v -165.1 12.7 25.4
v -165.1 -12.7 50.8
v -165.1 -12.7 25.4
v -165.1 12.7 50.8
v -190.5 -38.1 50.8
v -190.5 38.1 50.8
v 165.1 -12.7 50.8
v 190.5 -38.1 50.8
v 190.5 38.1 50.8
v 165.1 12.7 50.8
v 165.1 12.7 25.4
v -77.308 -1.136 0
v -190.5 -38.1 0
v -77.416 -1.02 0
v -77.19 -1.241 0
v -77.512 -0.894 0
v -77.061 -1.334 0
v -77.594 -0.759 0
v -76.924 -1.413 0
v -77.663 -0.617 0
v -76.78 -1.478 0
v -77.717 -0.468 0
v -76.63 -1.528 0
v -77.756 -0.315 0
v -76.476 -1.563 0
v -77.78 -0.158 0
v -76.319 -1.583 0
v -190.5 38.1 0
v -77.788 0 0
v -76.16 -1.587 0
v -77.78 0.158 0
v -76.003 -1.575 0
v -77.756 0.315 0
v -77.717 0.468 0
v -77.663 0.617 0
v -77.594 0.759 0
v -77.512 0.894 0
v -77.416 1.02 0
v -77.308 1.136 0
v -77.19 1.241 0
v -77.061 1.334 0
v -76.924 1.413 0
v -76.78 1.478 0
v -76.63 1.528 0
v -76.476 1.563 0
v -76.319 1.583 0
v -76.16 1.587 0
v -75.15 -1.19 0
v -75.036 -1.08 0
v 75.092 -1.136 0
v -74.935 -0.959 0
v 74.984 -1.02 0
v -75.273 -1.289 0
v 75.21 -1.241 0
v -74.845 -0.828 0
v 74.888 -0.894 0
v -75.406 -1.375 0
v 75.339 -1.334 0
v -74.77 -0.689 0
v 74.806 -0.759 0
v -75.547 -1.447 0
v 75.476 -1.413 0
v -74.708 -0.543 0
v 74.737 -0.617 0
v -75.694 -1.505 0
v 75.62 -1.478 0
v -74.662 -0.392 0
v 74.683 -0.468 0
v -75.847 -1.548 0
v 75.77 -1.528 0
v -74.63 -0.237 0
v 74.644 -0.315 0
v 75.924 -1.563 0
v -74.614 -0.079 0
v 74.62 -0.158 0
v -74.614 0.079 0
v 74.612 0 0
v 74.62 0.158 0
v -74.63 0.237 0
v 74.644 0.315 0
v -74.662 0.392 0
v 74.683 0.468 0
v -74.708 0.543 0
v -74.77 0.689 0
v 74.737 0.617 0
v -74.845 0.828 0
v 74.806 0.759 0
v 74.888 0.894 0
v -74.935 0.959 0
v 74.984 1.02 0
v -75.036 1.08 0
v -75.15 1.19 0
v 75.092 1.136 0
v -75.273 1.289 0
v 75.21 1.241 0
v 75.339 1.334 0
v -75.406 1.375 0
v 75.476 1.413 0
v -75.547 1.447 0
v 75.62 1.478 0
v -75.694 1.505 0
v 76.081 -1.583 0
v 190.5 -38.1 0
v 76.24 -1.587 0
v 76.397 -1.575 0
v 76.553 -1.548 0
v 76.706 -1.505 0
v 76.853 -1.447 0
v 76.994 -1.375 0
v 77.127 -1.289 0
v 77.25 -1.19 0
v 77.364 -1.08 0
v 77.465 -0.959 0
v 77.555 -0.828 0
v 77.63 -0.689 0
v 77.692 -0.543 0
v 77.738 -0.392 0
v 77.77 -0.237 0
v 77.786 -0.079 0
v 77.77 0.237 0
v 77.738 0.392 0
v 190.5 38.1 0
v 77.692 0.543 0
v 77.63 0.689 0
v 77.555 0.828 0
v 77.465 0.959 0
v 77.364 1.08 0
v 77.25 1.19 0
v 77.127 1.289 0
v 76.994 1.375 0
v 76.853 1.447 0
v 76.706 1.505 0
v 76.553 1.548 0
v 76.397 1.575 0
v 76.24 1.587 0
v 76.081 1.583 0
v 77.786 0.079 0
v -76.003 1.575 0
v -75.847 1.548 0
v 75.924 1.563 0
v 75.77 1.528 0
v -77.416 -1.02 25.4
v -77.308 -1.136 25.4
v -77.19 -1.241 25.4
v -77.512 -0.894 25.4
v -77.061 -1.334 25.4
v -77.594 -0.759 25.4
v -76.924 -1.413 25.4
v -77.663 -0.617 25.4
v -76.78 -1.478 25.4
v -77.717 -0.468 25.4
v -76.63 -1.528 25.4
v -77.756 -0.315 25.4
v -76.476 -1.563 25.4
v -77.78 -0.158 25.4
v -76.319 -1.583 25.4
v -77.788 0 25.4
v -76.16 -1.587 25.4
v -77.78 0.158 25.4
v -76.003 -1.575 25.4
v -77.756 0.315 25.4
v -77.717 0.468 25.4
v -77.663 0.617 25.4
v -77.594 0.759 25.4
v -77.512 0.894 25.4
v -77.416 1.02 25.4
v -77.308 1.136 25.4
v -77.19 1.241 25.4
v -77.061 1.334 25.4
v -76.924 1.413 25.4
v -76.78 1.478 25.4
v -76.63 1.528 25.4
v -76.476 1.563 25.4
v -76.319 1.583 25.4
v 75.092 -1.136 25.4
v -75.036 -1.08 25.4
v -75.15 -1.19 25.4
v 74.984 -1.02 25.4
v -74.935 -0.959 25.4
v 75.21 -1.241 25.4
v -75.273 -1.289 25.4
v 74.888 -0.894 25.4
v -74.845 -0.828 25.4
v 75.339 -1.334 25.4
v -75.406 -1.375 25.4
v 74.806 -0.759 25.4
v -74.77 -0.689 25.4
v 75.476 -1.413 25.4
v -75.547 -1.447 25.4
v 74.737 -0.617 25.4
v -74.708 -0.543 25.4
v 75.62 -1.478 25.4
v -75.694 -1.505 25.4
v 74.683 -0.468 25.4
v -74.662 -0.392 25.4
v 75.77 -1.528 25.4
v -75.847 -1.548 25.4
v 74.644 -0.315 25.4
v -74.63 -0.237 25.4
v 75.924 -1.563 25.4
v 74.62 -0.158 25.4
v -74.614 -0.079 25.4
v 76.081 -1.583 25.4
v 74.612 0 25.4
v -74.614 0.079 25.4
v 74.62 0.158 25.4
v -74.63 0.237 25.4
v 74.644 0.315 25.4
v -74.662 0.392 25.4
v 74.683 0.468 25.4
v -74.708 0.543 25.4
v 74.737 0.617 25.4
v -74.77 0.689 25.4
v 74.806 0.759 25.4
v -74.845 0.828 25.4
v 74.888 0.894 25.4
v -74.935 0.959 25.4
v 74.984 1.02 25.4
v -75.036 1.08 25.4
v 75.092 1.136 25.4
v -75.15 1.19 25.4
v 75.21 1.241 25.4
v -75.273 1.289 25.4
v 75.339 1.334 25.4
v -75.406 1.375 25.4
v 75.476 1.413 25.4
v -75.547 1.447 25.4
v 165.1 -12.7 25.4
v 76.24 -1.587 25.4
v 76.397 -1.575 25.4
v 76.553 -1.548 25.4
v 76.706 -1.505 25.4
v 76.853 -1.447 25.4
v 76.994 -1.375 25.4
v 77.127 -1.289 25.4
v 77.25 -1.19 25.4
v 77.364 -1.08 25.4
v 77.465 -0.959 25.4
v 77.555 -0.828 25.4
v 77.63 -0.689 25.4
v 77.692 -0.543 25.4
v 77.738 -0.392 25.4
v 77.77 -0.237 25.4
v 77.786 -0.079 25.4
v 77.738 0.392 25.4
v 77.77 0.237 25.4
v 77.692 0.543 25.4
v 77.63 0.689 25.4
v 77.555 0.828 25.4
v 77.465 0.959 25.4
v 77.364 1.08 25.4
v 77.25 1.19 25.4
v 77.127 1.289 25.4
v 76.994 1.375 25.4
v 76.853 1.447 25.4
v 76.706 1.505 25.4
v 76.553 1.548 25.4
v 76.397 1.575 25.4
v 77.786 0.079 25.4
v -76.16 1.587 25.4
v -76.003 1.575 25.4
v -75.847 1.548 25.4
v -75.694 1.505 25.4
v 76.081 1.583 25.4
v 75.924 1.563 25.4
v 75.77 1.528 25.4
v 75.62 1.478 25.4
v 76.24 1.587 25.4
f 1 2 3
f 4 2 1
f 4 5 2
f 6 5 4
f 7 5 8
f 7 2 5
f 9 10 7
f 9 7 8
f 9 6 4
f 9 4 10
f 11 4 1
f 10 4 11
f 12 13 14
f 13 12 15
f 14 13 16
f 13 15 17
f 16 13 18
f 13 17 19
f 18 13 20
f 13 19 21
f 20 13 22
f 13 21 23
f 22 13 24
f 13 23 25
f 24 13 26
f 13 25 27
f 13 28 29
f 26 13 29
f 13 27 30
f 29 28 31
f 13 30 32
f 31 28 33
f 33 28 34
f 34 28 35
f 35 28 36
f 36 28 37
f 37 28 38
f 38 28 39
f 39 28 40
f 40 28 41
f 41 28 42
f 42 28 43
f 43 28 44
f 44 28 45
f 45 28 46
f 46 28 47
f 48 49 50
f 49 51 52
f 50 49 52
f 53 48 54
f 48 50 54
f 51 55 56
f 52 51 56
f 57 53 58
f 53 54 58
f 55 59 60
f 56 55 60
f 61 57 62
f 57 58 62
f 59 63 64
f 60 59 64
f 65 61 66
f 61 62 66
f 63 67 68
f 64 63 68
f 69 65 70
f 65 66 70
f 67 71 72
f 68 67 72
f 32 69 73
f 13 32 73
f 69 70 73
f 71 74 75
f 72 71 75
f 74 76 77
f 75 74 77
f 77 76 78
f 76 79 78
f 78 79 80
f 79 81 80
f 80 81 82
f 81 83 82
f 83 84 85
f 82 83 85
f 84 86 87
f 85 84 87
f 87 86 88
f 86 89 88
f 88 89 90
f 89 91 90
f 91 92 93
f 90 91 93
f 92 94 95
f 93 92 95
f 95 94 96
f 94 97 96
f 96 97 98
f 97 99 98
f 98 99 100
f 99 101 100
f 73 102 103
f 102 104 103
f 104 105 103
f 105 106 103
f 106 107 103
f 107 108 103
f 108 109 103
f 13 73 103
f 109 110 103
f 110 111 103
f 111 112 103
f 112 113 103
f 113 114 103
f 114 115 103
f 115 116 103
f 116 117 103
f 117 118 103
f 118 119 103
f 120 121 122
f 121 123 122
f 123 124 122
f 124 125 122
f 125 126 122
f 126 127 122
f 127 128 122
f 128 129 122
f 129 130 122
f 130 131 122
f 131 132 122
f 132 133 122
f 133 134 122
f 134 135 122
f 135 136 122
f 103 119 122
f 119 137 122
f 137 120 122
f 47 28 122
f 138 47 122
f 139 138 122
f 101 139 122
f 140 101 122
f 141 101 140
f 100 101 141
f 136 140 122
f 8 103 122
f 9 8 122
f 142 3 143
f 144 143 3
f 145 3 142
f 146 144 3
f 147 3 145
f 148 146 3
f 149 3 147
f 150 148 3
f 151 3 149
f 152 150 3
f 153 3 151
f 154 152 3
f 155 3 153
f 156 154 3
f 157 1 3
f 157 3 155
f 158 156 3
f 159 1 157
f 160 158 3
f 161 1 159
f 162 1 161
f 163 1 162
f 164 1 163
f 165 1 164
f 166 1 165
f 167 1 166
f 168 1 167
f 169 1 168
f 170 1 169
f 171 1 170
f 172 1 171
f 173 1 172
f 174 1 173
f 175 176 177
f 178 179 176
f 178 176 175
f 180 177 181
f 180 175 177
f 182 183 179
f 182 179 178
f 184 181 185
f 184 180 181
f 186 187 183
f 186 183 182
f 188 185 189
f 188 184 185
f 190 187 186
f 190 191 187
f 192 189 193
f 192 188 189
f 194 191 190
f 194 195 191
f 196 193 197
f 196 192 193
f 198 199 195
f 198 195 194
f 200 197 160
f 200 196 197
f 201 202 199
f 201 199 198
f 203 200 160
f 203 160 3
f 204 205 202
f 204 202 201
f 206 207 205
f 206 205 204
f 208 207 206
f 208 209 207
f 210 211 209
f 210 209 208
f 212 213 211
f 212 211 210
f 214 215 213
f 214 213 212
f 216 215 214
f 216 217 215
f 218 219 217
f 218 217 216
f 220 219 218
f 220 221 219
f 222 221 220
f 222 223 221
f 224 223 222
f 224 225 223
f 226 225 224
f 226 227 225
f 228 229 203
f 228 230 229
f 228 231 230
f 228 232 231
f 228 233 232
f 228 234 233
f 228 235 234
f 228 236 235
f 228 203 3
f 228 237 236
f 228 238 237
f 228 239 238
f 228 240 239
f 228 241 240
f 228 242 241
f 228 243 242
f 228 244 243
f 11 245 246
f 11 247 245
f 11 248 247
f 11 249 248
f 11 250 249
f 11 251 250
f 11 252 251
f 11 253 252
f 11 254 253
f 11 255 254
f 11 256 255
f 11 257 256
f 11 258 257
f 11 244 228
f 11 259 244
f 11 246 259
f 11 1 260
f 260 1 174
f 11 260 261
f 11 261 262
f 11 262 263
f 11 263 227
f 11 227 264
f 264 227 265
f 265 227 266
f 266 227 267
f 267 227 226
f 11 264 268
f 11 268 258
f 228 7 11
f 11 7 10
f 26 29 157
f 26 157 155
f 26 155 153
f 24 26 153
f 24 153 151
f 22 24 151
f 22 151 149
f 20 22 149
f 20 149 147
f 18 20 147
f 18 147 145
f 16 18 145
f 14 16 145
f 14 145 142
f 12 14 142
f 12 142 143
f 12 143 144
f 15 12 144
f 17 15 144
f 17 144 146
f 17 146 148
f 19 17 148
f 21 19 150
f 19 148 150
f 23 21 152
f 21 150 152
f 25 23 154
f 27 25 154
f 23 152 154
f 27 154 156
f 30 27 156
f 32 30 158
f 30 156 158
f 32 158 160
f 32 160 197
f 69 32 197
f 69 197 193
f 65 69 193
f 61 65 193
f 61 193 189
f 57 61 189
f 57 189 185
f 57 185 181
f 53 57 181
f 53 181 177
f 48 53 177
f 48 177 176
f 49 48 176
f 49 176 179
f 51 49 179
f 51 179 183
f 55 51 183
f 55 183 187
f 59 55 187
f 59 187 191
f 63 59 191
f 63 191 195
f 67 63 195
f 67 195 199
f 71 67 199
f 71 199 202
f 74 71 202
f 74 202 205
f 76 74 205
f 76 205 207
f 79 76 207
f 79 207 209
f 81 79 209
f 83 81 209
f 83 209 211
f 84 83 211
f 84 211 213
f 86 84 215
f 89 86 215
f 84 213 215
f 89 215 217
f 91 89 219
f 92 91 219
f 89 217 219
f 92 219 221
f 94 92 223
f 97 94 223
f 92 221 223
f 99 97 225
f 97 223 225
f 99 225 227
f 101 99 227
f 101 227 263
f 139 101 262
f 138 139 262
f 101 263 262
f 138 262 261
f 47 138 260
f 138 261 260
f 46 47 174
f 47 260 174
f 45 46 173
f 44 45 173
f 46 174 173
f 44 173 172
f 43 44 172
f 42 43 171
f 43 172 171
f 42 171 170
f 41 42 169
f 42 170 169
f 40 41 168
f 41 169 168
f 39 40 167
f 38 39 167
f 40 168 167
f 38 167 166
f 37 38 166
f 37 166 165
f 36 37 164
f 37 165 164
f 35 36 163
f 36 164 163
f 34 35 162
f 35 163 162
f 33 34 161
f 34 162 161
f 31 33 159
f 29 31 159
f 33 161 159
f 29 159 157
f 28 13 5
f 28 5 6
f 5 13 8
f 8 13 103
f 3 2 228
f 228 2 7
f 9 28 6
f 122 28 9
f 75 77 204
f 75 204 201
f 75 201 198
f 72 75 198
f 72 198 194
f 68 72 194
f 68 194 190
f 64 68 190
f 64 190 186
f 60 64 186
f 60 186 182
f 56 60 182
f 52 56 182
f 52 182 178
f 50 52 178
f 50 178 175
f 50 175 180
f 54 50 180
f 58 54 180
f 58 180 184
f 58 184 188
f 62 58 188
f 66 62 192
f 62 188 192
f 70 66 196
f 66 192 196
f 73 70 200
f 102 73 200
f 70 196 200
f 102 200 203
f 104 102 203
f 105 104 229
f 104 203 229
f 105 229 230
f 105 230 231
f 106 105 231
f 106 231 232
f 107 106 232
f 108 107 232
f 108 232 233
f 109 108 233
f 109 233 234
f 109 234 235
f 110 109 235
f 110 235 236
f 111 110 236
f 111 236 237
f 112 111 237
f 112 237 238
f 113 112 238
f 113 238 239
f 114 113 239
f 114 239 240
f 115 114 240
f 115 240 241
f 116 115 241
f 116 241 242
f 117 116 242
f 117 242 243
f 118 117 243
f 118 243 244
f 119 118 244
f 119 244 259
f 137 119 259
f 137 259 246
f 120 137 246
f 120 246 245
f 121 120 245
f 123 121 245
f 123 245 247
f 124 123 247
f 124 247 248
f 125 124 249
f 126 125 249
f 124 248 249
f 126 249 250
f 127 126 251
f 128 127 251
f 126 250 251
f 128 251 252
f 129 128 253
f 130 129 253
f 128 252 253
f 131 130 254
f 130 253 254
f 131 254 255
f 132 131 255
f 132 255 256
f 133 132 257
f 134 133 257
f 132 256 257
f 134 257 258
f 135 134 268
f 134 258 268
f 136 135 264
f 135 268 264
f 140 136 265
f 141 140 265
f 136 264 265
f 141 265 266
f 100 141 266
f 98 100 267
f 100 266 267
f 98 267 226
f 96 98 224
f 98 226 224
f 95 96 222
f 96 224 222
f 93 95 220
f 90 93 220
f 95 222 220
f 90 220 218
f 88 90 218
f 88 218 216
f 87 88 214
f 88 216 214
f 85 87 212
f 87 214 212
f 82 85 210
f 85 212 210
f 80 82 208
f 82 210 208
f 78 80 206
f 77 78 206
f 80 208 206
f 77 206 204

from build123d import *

# Parameters (mm, degrees)
F0_W     = 381
F0_H     = 76.2
F1_DEPTH = 50.8
F2_W     = 330.2
F2_H     = 25.4
F3_DEPTH = 25.4
F5_D     = 3.175


with BuildPart() as f1:
    # F0 (on Top) → F1 (new body)
    with BuildSketch(Plane.XY):
        Rectangle(F0_W, F0_H)
    extrude(amount=F1_DEPTH)

    # F2 (on face) → F3 (cut)
    with BuildSketch(Plane.XY.offset(50.8)):
        Rectangle(F2_W, F2_H)
    extrude(amount=-F3_DEPTH, mode=Mode.SUBTRACT)

    # F5 (through all)
    with Locations(Plane(origin=(0, 0, 0), x_dir=(1, 0, 0), z_dir=(0, 0, -1))):
        with Locations((-76.2, 0), (76.2, 0)):
            Hole(F5_D / 2)


solid = f1.part
